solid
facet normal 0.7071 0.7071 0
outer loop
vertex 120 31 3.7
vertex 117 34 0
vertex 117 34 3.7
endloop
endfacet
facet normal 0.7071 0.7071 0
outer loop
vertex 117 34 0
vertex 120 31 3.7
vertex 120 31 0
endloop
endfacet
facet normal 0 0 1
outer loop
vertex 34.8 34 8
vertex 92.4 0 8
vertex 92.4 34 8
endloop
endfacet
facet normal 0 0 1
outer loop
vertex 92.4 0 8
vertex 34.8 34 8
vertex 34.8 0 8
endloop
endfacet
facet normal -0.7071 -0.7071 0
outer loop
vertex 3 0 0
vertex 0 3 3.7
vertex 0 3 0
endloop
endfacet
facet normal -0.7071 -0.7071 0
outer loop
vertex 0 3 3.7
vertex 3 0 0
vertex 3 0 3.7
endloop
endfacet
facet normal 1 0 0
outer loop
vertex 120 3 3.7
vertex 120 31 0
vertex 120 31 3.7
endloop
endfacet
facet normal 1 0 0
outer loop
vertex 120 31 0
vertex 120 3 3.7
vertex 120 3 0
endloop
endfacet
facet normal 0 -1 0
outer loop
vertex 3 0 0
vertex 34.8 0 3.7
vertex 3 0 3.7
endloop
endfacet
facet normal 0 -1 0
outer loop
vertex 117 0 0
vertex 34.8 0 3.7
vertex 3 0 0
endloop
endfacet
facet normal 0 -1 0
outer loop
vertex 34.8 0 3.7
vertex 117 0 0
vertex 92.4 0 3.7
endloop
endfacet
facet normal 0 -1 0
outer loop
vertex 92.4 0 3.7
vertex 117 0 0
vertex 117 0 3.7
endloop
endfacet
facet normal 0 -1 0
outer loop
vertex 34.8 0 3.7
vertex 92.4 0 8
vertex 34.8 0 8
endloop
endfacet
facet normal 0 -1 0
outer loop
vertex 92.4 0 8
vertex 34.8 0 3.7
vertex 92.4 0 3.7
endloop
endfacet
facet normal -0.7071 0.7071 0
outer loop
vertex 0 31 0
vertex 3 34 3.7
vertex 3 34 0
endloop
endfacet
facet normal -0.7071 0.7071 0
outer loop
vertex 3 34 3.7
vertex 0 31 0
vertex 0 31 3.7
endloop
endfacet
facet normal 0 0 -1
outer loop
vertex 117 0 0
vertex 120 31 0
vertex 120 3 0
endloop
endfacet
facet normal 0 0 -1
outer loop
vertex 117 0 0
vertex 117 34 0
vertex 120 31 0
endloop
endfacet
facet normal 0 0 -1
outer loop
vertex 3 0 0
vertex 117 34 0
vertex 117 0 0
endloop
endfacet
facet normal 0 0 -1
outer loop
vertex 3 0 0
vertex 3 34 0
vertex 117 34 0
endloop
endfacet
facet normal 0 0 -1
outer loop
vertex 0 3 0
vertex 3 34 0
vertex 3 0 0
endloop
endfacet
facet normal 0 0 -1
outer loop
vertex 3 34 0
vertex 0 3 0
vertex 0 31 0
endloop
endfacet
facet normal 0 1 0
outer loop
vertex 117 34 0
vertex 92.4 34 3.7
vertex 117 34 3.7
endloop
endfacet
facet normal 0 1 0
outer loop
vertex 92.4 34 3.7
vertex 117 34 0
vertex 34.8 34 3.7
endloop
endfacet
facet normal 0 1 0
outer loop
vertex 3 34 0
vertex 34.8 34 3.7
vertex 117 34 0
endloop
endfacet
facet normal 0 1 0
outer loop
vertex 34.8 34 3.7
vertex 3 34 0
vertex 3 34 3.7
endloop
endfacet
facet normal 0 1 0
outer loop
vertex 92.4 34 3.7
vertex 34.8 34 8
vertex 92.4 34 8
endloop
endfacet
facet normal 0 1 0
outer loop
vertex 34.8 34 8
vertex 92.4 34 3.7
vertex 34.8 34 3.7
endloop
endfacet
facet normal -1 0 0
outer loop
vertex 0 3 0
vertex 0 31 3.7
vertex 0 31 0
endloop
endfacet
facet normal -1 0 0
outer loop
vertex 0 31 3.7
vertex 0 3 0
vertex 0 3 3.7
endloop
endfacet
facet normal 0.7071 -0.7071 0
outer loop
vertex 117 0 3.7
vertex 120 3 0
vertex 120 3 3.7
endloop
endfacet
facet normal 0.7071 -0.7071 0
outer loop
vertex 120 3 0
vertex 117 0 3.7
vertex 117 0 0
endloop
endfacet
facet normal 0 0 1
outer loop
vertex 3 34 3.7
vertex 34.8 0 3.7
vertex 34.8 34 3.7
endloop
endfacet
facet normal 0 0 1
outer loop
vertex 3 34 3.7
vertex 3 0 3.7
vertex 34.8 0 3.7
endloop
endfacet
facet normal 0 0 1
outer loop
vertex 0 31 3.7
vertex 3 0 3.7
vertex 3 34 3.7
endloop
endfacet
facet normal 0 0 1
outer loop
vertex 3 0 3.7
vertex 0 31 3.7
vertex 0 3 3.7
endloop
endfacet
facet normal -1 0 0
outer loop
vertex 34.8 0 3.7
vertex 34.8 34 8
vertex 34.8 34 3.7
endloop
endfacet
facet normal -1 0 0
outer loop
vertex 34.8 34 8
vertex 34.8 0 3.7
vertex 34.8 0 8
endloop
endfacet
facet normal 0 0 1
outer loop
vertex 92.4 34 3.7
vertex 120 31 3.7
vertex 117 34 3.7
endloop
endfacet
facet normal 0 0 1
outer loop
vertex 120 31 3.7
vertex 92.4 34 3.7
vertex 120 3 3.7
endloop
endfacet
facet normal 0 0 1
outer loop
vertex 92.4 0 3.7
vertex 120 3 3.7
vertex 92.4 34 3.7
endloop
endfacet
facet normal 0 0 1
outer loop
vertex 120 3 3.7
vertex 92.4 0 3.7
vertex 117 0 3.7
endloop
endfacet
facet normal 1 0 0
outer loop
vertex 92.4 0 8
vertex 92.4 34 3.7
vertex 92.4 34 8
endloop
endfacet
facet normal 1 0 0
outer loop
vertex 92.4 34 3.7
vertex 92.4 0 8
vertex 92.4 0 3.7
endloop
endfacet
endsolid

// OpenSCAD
$fn = 32;

// ----------------------------------------------------------------------
// Stepped bar: centerstep, 120 x 34 x 8/3.7 mm
// ----------------------------------------------------------------------

// --- parameters (mm) ---
bar_l = 120;              // bar length, X
bar_w = 34;               // bar width, Y
plate_t = 8;              // thickness of the thick zone, Z
thin_t = 3.7;             // thickness of the thin zone
corner_c = 3;             // corner chamfer of the bar
step_cut = 4.3;           // material removed from the thin zone
thick_from = 34.8;        // start of the thick middle zone
thick_to = 92.4;          // end of the thick middle zone
depth_1 = 4.3;            // depth of cut 1 from the top face
depth_2 = 4.3;            // depth of cut 2 from the top face

profile = [[3, 0], [117, 0], [120, 3], [120, 31], [117, 34], [3, 34], [0, 31], [0, 3]];  // primary outline, 8 points, counter clockwise
void_1 = [[-1, -1], [34.8, -1], [34.8, 35], [-1, 35]];  // thin left end, 4 points
void_2 = [[92.4, -1], [121, -1], [121, 35], [92.4, 35]];  // thin right end, 4 points

// --- the one profile operation ---
difference() {
  linear_extrude(height = plate_t) polygon(points = profile);
  translate([0, 0, plate_t - depth_1])
    linear_extrude(height = depth_1 + 1) polygon(points = void_1);
  translate([0, 0, plate_t - depth_2])
    linear_extrude(height = depth_2 + 1) polygon(points = void_2);
}
